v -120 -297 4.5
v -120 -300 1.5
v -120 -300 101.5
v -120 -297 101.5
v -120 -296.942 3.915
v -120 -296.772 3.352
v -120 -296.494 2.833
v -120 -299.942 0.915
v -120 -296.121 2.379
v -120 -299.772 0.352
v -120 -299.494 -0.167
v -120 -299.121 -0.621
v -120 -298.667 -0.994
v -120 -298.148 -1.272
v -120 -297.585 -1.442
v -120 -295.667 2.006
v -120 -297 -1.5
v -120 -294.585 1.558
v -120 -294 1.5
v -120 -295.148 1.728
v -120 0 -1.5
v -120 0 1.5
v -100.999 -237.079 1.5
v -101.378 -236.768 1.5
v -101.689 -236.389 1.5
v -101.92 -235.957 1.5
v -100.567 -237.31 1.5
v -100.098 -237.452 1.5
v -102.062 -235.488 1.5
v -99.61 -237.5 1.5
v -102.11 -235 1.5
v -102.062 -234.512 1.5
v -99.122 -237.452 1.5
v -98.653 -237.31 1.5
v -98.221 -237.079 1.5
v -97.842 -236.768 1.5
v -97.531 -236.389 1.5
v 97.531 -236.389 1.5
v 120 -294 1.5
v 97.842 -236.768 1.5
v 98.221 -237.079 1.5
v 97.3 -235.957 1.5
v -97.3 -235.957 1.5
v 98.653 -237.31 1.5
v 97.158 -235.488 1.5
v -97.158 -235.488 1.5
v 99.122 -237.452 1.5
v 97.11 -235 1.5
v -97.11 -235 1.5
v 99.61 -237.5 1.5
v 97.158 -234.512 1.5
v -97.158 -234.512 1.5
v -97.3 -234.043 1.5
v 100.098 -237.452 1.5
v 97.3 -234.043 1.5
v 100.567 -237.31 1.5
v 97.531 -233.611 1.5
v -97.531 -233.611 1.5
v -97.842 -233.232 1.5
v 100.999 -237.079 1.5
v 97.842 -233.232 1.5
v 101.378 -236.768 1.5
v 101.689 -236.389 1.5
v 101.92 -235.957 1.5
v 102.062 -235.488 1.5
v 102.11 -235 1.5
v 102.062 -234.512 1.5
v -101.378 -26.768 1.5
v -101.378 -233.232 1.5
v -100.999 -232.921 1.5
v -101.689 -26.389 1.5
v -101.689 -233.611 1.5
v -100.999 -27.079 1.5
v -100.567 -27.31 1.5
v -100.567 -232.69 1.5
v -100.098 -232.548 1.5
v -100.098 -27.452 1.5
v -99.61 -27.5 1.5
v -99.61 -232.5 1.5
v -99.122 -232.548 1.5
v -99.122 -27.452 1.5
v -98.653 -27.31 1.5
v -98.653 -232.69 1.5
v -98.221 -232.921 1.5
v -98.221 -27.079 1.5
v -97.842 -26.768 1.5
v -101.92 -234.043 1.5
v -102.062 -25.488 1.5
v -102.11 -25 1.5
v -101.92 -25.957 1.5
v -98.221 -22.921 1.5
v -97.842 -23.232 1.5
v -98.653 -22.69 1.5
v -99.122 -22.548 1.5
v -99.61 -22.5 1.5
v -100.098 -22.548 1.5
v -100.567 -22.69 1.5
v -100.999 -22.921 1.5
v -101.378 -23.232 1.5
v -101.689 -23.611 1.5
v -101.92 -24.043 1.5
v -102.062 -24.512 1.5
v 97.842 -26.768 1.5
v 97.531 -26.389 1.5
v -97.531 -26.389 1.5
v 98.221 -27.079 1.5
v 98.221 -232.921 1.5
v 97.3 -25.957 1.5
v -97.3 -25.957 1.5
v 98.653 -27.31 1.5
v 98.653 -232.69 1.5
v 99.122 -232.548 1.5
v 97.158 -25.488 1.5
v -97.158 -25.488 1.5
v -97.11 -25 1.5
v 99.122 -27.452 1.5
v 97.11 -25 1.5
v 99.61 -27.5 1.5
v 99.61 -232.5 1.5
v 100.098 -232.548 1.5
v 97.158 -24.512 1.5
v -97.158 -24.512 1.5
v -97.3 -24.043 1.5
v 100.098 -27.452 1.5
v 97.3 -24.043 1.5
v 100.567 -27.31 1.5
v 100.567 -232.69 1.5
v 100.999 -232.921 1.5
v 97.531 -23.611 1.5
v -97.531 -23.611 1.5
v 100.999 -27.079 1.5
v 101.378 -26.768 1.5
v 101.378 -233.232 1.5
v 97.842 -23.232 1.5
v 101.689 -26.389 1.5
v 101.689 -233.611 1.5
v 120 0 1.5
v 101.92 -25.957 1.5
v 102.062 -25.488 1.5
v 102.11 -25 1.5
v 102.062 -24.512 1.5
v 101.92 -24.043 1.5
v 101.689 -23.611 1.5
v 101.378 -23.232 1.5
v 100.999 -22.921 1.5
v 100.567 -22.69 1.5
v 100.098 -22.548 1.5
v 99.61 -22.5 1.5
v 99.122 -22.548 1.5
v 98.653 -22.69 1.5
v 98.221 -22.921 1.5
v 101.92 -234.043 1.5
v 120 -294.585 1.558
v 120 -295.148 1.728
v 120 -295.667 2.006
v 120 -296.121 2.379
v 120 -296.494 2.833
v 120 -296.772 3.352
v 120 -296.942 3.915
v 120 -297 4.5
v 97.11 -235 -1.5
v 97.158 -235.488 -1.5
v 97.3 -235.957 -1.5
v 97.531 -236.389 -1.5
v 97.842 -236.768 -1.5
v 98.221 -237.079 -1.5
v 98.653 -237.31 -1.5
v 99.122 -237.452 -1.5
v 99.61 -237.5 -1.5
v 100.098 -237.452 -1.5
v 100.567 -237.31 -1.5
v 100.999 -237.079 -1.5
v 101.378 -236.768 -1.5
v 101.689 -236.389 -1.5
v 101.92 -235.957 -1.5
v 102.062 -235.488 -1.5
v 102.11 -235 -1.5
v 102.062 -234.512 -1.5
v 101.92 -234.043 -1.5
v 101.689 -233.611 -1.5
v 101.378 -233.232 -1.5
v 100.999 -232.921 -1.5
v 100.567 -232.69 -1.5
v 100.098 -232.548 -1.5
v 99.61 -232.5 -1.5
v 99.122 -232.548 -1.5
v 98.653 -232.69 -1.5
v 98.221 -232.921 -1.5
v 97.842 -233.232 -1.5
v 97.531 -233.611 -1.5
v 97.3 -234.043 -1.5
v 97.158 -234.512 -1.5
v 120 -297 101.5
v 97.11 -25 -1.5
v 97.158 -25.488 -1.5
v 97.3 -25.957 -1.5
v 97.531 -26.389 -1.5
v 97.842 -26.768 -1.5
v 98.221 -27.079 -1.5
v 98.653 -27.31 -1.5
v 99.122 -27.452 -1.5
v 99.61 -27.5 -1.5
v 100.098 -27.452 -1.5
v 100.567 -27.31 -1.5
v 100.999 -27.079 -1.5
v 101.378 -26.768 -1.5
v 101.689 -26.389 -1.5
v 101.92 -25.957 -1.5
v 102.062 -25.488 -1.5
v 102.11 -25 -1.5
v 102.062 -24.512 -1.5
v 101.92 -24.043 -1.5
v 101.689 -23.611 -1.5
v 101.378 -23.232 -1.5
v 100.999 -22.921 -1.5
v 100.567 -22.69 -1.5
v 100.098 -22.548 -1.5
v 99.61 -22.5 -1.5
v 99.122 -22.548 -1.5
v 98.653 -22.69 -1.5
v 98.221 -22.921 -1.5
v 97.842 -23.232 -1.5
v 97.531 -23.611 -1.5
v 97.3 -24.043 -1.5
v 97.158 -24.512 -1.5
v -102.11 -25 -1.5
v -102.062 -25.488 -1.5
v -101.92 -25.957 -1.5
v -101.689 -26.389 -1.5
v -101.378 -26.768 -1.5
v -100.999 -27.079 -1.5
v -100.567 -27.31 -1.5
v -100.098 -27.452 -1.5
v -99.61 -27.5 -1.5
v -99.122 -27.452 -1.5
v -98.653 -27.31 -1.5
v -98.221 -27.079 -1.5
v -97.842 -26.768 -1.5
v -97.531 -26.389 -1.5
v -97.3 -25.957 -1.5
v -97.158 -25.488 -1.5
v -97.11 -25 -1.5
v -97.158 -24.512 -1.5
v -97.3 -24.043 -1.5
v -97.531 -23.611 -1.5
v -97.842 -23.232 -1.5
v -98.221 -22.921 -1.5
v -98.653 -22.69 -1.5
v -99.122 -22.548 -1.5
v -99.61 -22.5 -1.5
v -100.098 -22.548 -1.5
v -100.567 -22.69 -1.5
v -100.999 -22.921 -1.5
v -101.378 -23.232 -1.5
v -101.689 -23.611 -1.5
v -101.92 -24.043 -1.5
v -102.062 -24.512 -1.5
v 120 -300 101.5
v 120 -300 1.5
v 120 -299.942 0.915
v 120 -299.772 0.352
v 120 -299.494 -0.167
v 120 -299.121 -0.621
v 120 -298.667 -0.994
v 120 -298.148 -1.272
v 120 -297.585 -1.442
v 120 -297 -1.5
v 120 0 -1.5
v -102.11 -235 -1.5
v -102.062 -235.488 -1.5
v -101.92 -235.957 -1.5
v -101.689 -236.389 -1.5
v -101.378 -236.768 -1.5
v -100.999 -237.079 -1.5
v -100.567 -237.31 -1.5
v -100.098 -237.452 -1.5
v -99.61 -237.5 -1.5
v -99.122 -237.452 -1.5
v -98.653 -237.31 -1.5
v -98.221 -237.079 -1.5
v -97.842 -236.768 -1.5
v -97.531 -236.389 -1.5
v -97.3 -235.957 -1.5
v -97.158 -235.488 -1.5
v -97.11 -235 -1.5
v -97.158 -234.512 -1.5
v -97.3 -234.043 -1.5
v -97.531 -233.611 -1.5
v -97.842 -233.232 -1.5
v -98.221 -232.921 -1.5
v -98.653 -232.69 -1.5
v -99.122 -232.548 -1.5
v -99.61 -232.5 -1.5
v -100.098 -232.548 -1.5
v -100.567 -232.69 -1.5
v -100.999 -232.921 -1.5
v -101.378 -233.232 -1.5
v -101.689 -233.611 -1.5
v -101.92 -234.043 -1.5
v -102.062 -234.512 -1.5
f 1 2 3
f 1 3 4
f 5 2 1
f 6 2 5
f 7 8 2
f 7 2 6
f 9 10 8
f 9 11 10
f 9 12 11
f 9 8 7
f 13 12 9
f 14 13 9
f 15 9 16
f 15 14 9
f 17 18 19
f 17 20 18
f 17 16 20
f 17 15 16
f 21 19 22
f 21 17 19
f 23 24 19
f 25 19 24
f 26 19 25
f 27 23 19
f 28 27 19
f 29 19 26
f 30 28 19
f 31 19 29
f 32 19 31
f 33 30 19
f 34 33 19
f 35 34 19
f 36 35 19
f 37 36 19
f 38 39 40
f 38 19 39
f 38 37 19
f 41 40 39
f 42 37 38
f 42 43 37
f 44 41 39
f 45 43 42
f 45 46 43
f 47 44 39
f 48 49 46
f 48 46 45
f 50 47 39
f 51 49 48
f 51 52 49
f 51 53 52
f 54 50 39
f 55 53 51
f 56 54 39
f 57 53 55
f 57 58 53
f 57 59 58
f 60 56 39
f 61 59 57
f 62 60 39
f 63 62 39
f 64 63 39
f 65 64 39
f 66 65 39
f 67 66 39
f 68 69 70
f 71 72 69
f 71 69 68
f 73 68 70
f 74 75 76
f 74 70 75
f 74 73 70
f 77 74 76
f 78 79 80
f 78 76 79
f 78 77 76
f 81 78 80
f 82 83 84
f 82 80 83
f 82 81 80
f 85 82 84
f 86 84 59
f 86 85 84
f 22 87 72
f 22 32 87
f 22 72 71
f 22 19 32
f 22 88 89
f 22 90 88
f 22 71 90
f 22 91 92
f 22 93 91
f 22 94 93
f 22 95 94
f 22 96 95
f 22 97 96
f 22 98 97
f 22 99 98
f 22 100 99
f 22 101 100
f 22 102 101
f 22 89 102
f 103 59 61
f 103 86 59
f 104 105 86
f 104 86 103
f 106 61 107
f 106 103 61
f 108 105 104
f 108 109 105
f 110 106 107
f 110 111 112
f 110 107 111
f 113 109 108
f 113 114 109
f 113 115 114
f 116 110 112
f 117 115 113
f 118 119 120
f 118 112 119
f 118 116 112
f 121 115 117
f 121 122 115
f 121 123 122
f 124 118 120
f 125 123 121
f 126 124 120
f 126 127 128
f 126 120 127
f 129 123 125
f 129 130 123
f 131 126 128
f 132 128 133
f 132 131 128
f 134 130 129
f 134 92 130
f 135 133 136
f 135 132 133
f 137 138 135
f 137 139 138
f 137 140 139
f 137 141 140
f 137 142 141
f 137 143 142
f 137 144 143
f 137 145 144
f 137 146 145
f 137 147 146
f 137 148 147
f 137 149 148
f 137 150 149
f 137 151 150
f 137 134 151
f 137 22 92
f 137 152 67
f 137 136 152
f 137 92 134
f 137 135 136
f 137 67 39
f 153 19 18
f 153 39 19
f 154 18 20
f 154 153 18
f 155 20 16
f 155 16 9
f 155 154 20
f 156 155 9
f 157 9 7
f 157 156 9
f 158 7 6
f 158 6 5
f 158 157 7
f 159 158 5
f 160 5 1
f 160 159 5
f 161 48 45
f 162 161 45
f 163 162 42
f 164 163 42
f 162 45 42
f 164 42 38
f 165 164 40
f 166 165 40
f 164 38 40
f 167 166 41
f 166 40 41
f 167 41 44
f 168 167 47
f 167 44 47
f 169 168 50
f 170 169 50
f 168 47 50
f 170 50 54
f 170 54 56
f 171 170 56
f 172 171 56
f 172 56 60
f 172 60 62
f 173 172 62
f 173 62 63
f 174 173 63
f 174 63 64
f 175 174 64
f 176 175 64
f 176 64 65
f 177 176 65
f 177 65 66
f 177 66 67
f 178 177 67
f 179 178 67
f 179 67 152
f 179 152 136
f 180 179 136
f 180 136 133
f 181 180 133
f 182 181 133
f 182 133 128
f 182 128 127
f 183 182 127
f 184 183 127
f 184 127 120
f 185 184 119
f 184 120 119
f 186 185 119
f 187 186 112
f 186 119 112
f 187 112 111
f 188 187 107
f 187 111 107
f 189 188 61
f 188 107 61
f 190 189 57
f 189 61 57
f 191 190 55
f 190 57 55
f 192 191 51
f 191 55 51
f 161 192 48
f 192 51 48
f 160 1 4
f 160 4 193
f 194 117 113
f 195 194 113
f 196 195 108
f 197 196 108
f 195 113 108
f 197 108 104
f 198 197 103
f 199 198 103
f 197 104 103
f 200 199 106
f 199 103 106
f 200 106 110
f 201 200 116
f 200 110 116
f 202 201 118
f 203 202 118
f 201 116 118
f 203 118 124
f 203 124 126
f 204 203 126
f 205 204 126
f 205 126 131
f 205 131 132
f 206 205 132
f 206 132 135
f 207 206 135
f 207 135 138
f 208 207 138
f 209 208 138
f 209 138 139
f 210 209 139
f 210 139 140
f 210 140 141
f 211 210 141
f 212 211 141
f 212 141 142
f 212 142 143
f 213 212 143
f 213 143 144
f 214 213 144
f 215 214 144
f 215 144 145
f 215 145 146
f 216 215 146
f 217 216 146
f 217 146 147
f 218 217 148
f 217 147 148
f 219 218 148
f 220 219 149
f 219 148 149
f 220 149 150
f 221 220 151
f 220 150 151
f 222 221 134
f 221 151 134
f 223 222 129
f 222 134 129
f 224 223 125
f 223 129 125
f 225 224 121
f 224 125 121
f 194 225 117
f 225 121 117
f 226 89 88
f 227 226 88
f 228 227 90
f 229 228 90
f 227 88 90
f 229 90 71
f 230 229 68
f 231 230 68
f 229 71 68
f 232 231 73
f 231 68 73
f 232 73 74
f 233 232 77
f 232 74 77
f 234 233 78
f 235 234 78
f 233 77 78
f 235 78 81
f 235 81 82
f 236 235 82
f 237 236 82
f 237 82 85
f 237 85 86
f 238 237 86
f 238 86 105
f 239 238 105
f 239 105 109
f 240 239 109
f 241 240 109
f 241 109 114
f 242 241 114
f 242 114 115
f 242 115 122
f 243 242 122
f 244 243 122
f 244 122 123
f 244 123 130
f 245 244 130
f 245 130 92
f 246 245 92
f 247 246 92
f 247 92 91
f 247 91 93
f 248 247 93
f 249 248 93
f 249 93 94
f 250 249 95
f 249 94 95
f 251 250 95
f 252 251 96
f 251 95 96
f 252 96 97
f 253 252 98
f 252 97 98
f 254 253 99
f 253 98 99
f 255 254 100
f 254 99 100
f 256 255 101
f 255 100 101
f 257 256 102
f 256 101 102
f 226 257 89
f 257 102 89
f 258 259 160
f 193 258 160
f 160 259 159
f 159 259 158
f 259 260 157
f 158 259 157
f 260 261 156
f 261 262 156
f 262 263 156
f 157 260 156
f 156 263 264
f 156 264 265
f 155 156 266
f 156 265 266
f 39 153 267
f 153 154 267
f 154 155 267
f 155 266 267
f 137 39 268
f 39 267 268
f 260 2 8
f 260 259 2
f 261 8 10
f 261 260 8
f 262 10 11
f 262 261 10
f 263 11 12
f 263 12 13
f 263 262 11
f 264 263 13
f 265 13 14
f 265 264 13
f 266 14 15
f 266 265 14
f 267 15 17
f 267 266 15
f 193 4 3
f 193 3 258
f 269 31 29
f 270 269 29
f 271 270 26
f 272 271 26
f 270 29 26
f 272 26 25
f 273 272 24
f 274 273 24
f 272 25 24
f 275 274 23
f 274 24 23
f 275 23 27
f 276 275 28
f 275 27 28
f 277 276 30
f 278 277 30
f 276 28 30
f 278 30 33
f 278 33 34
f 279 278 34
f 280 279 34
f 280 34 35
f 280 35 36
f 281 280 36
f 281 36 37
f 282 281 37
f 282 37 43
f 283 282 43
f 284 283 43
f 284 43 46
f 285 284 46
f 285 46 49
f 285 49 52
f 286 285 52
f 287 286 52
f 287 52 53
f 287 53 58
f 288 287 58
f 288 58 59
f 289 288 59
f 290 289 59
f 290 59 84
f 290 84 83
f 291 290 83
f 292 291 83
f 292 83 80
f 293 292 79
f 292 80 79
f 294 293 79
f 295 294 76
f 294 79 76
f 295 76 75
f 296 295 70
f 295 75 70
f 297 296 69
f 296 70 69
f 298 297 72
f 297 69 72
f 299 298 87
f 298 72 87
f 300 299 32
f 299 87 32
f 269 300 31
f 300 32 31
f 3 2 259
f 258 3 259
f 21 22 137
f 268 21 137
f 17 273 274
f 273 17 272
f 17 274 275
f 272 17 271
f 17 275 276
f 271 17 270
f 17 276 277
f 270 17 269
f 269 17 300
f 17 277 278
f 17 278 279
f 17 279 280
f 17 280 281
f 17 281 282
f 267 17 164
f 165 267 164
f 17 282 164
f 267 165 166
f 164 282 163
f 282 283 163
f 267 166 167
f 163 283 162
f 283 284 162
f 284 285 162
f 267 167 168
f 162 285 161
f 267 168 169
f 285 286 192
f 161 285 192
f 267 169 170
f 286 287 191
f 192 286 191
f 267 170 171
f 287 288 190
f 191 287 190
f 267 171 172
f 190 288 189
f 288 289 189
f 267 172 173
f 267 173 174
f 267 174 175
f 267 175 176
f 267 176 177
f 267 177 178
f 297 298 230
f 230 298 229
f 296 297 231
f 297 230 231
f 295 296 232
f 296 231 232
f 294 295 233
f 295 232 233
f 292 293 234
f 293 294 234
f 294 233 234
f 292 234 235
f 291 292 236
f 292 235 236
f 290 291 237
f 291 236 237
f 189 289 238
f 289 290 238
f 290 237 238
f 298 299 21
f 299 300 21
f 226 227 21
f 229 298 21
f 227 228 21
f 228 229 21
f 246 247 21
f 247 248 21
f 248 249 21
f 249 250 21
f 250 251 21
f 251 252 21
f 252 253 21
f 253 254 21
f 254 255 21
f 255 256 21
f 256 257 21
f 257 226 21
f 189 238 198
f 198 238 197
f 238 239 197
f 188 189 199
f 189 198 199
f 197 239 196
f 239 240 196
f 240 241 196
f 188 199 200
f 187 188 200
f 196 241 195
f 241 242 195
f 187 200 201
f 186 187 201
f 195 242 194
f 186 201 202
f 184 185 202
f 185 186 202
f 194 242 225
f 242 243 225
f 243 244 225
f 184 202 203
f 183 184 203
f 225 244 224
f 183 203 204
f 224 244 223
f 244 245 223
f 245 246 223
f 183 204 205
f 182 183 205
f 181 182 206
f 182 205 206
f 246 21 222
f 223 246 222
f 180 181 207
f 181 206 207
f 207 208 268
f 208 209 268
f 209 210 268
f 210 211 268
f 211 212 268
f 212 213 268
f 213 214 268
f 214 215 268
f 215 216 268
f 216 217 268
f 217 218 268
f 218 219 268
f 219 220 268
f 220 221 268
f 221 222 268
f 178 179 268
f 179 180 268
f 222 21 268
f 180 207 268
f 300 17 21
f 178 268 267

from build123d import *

# Parameters (mm, degrees)
F0_W     = 240
F0_H     = 3
F1_DEPTH = 300
F3_DEPTH = 25
F4_W     = 240
F4_H     = 3
F5_DEPTH = 100
F6_R     = 3


with BuildPart() as f1:
    # F0 (on Front) → F1 (new body)
    with BuildSketch(Plane.XZ):
        Rectangle(F0_W, F0_H)
    extrude(amount=F1_DEPTH)

    # F2 (on face) → F3 (cut)
    with BuildSketch(Plane.XY.offset(1.5)):
        with BuildLine():
            ThreePointArc((-97.11, -25), (-99.61, -22.5), (-102.11, -25))
            Line((-102.11, -25), (-97.11, -25))
        make_face()
        with BuildLine():
            ThreePointArc((102.11, -25), (99.61, -22.5), (97.11, -25))
            Line((97.11, -25), (102.11, -25))
        make_face()
        with BuildLine():
            Line((102.11, -25), (97.11, -25))
            ThreePointArc((97.11, -25), (99.61, -27.5), (102.11, -25))
        make_face()
        with BuildLine():
            Line((-97.11, -25), (-102.11, -25))
            ThreePointArc((-102.11, -25), (-99.61, -27.5), (-97.11, -25))
        make_face()
        with BuildLine():
            ThreePointArc((-97.11, -235), (-99.61, -232.5), (-102.11, -235))
            Line((-102.11, -235), (-97.11, -235))
        make_face()
        with BuildLine():
            ThreePointArc((102.11, -235), (99.61, -232.5), (97.11, -235))
            Line((97.11, -235), (102.11, -235))
        make_face()
        with BuildLine():
            Line((102.11, -235), (97.11, -235))
            ThreePointArc((97.11, -235), (99.61, -237.5), (102.11, -235))
        make_face()
        with BuildLine():
            Line((-97.11, -235), (-102.11, -235))
            ThreePointArc((-102.11, -235), (-99.61, -237.5), (-97.11, -235))
        make_face()
    extrude(amount=-F3_DEPTH, mode=Mode.SUBTRACT)

    # F4 (on face) → F5 (join)
    with BuildSketch(Plane.XY.offset(1.5)):
        with Locations((0, -298.5)):
            Rectangle(F4_W, F4_H)
    extrude(amount=F5_DEPTH)

    # F6
    f6_edges = [f1.edges().sort_by_distance(p)[0] for p in [
        (0, -297, 1.5),
        (0, -300, -1.5),
    ]]
    fillet(f6_edges, radius=F6_R)


solid = f1.part
